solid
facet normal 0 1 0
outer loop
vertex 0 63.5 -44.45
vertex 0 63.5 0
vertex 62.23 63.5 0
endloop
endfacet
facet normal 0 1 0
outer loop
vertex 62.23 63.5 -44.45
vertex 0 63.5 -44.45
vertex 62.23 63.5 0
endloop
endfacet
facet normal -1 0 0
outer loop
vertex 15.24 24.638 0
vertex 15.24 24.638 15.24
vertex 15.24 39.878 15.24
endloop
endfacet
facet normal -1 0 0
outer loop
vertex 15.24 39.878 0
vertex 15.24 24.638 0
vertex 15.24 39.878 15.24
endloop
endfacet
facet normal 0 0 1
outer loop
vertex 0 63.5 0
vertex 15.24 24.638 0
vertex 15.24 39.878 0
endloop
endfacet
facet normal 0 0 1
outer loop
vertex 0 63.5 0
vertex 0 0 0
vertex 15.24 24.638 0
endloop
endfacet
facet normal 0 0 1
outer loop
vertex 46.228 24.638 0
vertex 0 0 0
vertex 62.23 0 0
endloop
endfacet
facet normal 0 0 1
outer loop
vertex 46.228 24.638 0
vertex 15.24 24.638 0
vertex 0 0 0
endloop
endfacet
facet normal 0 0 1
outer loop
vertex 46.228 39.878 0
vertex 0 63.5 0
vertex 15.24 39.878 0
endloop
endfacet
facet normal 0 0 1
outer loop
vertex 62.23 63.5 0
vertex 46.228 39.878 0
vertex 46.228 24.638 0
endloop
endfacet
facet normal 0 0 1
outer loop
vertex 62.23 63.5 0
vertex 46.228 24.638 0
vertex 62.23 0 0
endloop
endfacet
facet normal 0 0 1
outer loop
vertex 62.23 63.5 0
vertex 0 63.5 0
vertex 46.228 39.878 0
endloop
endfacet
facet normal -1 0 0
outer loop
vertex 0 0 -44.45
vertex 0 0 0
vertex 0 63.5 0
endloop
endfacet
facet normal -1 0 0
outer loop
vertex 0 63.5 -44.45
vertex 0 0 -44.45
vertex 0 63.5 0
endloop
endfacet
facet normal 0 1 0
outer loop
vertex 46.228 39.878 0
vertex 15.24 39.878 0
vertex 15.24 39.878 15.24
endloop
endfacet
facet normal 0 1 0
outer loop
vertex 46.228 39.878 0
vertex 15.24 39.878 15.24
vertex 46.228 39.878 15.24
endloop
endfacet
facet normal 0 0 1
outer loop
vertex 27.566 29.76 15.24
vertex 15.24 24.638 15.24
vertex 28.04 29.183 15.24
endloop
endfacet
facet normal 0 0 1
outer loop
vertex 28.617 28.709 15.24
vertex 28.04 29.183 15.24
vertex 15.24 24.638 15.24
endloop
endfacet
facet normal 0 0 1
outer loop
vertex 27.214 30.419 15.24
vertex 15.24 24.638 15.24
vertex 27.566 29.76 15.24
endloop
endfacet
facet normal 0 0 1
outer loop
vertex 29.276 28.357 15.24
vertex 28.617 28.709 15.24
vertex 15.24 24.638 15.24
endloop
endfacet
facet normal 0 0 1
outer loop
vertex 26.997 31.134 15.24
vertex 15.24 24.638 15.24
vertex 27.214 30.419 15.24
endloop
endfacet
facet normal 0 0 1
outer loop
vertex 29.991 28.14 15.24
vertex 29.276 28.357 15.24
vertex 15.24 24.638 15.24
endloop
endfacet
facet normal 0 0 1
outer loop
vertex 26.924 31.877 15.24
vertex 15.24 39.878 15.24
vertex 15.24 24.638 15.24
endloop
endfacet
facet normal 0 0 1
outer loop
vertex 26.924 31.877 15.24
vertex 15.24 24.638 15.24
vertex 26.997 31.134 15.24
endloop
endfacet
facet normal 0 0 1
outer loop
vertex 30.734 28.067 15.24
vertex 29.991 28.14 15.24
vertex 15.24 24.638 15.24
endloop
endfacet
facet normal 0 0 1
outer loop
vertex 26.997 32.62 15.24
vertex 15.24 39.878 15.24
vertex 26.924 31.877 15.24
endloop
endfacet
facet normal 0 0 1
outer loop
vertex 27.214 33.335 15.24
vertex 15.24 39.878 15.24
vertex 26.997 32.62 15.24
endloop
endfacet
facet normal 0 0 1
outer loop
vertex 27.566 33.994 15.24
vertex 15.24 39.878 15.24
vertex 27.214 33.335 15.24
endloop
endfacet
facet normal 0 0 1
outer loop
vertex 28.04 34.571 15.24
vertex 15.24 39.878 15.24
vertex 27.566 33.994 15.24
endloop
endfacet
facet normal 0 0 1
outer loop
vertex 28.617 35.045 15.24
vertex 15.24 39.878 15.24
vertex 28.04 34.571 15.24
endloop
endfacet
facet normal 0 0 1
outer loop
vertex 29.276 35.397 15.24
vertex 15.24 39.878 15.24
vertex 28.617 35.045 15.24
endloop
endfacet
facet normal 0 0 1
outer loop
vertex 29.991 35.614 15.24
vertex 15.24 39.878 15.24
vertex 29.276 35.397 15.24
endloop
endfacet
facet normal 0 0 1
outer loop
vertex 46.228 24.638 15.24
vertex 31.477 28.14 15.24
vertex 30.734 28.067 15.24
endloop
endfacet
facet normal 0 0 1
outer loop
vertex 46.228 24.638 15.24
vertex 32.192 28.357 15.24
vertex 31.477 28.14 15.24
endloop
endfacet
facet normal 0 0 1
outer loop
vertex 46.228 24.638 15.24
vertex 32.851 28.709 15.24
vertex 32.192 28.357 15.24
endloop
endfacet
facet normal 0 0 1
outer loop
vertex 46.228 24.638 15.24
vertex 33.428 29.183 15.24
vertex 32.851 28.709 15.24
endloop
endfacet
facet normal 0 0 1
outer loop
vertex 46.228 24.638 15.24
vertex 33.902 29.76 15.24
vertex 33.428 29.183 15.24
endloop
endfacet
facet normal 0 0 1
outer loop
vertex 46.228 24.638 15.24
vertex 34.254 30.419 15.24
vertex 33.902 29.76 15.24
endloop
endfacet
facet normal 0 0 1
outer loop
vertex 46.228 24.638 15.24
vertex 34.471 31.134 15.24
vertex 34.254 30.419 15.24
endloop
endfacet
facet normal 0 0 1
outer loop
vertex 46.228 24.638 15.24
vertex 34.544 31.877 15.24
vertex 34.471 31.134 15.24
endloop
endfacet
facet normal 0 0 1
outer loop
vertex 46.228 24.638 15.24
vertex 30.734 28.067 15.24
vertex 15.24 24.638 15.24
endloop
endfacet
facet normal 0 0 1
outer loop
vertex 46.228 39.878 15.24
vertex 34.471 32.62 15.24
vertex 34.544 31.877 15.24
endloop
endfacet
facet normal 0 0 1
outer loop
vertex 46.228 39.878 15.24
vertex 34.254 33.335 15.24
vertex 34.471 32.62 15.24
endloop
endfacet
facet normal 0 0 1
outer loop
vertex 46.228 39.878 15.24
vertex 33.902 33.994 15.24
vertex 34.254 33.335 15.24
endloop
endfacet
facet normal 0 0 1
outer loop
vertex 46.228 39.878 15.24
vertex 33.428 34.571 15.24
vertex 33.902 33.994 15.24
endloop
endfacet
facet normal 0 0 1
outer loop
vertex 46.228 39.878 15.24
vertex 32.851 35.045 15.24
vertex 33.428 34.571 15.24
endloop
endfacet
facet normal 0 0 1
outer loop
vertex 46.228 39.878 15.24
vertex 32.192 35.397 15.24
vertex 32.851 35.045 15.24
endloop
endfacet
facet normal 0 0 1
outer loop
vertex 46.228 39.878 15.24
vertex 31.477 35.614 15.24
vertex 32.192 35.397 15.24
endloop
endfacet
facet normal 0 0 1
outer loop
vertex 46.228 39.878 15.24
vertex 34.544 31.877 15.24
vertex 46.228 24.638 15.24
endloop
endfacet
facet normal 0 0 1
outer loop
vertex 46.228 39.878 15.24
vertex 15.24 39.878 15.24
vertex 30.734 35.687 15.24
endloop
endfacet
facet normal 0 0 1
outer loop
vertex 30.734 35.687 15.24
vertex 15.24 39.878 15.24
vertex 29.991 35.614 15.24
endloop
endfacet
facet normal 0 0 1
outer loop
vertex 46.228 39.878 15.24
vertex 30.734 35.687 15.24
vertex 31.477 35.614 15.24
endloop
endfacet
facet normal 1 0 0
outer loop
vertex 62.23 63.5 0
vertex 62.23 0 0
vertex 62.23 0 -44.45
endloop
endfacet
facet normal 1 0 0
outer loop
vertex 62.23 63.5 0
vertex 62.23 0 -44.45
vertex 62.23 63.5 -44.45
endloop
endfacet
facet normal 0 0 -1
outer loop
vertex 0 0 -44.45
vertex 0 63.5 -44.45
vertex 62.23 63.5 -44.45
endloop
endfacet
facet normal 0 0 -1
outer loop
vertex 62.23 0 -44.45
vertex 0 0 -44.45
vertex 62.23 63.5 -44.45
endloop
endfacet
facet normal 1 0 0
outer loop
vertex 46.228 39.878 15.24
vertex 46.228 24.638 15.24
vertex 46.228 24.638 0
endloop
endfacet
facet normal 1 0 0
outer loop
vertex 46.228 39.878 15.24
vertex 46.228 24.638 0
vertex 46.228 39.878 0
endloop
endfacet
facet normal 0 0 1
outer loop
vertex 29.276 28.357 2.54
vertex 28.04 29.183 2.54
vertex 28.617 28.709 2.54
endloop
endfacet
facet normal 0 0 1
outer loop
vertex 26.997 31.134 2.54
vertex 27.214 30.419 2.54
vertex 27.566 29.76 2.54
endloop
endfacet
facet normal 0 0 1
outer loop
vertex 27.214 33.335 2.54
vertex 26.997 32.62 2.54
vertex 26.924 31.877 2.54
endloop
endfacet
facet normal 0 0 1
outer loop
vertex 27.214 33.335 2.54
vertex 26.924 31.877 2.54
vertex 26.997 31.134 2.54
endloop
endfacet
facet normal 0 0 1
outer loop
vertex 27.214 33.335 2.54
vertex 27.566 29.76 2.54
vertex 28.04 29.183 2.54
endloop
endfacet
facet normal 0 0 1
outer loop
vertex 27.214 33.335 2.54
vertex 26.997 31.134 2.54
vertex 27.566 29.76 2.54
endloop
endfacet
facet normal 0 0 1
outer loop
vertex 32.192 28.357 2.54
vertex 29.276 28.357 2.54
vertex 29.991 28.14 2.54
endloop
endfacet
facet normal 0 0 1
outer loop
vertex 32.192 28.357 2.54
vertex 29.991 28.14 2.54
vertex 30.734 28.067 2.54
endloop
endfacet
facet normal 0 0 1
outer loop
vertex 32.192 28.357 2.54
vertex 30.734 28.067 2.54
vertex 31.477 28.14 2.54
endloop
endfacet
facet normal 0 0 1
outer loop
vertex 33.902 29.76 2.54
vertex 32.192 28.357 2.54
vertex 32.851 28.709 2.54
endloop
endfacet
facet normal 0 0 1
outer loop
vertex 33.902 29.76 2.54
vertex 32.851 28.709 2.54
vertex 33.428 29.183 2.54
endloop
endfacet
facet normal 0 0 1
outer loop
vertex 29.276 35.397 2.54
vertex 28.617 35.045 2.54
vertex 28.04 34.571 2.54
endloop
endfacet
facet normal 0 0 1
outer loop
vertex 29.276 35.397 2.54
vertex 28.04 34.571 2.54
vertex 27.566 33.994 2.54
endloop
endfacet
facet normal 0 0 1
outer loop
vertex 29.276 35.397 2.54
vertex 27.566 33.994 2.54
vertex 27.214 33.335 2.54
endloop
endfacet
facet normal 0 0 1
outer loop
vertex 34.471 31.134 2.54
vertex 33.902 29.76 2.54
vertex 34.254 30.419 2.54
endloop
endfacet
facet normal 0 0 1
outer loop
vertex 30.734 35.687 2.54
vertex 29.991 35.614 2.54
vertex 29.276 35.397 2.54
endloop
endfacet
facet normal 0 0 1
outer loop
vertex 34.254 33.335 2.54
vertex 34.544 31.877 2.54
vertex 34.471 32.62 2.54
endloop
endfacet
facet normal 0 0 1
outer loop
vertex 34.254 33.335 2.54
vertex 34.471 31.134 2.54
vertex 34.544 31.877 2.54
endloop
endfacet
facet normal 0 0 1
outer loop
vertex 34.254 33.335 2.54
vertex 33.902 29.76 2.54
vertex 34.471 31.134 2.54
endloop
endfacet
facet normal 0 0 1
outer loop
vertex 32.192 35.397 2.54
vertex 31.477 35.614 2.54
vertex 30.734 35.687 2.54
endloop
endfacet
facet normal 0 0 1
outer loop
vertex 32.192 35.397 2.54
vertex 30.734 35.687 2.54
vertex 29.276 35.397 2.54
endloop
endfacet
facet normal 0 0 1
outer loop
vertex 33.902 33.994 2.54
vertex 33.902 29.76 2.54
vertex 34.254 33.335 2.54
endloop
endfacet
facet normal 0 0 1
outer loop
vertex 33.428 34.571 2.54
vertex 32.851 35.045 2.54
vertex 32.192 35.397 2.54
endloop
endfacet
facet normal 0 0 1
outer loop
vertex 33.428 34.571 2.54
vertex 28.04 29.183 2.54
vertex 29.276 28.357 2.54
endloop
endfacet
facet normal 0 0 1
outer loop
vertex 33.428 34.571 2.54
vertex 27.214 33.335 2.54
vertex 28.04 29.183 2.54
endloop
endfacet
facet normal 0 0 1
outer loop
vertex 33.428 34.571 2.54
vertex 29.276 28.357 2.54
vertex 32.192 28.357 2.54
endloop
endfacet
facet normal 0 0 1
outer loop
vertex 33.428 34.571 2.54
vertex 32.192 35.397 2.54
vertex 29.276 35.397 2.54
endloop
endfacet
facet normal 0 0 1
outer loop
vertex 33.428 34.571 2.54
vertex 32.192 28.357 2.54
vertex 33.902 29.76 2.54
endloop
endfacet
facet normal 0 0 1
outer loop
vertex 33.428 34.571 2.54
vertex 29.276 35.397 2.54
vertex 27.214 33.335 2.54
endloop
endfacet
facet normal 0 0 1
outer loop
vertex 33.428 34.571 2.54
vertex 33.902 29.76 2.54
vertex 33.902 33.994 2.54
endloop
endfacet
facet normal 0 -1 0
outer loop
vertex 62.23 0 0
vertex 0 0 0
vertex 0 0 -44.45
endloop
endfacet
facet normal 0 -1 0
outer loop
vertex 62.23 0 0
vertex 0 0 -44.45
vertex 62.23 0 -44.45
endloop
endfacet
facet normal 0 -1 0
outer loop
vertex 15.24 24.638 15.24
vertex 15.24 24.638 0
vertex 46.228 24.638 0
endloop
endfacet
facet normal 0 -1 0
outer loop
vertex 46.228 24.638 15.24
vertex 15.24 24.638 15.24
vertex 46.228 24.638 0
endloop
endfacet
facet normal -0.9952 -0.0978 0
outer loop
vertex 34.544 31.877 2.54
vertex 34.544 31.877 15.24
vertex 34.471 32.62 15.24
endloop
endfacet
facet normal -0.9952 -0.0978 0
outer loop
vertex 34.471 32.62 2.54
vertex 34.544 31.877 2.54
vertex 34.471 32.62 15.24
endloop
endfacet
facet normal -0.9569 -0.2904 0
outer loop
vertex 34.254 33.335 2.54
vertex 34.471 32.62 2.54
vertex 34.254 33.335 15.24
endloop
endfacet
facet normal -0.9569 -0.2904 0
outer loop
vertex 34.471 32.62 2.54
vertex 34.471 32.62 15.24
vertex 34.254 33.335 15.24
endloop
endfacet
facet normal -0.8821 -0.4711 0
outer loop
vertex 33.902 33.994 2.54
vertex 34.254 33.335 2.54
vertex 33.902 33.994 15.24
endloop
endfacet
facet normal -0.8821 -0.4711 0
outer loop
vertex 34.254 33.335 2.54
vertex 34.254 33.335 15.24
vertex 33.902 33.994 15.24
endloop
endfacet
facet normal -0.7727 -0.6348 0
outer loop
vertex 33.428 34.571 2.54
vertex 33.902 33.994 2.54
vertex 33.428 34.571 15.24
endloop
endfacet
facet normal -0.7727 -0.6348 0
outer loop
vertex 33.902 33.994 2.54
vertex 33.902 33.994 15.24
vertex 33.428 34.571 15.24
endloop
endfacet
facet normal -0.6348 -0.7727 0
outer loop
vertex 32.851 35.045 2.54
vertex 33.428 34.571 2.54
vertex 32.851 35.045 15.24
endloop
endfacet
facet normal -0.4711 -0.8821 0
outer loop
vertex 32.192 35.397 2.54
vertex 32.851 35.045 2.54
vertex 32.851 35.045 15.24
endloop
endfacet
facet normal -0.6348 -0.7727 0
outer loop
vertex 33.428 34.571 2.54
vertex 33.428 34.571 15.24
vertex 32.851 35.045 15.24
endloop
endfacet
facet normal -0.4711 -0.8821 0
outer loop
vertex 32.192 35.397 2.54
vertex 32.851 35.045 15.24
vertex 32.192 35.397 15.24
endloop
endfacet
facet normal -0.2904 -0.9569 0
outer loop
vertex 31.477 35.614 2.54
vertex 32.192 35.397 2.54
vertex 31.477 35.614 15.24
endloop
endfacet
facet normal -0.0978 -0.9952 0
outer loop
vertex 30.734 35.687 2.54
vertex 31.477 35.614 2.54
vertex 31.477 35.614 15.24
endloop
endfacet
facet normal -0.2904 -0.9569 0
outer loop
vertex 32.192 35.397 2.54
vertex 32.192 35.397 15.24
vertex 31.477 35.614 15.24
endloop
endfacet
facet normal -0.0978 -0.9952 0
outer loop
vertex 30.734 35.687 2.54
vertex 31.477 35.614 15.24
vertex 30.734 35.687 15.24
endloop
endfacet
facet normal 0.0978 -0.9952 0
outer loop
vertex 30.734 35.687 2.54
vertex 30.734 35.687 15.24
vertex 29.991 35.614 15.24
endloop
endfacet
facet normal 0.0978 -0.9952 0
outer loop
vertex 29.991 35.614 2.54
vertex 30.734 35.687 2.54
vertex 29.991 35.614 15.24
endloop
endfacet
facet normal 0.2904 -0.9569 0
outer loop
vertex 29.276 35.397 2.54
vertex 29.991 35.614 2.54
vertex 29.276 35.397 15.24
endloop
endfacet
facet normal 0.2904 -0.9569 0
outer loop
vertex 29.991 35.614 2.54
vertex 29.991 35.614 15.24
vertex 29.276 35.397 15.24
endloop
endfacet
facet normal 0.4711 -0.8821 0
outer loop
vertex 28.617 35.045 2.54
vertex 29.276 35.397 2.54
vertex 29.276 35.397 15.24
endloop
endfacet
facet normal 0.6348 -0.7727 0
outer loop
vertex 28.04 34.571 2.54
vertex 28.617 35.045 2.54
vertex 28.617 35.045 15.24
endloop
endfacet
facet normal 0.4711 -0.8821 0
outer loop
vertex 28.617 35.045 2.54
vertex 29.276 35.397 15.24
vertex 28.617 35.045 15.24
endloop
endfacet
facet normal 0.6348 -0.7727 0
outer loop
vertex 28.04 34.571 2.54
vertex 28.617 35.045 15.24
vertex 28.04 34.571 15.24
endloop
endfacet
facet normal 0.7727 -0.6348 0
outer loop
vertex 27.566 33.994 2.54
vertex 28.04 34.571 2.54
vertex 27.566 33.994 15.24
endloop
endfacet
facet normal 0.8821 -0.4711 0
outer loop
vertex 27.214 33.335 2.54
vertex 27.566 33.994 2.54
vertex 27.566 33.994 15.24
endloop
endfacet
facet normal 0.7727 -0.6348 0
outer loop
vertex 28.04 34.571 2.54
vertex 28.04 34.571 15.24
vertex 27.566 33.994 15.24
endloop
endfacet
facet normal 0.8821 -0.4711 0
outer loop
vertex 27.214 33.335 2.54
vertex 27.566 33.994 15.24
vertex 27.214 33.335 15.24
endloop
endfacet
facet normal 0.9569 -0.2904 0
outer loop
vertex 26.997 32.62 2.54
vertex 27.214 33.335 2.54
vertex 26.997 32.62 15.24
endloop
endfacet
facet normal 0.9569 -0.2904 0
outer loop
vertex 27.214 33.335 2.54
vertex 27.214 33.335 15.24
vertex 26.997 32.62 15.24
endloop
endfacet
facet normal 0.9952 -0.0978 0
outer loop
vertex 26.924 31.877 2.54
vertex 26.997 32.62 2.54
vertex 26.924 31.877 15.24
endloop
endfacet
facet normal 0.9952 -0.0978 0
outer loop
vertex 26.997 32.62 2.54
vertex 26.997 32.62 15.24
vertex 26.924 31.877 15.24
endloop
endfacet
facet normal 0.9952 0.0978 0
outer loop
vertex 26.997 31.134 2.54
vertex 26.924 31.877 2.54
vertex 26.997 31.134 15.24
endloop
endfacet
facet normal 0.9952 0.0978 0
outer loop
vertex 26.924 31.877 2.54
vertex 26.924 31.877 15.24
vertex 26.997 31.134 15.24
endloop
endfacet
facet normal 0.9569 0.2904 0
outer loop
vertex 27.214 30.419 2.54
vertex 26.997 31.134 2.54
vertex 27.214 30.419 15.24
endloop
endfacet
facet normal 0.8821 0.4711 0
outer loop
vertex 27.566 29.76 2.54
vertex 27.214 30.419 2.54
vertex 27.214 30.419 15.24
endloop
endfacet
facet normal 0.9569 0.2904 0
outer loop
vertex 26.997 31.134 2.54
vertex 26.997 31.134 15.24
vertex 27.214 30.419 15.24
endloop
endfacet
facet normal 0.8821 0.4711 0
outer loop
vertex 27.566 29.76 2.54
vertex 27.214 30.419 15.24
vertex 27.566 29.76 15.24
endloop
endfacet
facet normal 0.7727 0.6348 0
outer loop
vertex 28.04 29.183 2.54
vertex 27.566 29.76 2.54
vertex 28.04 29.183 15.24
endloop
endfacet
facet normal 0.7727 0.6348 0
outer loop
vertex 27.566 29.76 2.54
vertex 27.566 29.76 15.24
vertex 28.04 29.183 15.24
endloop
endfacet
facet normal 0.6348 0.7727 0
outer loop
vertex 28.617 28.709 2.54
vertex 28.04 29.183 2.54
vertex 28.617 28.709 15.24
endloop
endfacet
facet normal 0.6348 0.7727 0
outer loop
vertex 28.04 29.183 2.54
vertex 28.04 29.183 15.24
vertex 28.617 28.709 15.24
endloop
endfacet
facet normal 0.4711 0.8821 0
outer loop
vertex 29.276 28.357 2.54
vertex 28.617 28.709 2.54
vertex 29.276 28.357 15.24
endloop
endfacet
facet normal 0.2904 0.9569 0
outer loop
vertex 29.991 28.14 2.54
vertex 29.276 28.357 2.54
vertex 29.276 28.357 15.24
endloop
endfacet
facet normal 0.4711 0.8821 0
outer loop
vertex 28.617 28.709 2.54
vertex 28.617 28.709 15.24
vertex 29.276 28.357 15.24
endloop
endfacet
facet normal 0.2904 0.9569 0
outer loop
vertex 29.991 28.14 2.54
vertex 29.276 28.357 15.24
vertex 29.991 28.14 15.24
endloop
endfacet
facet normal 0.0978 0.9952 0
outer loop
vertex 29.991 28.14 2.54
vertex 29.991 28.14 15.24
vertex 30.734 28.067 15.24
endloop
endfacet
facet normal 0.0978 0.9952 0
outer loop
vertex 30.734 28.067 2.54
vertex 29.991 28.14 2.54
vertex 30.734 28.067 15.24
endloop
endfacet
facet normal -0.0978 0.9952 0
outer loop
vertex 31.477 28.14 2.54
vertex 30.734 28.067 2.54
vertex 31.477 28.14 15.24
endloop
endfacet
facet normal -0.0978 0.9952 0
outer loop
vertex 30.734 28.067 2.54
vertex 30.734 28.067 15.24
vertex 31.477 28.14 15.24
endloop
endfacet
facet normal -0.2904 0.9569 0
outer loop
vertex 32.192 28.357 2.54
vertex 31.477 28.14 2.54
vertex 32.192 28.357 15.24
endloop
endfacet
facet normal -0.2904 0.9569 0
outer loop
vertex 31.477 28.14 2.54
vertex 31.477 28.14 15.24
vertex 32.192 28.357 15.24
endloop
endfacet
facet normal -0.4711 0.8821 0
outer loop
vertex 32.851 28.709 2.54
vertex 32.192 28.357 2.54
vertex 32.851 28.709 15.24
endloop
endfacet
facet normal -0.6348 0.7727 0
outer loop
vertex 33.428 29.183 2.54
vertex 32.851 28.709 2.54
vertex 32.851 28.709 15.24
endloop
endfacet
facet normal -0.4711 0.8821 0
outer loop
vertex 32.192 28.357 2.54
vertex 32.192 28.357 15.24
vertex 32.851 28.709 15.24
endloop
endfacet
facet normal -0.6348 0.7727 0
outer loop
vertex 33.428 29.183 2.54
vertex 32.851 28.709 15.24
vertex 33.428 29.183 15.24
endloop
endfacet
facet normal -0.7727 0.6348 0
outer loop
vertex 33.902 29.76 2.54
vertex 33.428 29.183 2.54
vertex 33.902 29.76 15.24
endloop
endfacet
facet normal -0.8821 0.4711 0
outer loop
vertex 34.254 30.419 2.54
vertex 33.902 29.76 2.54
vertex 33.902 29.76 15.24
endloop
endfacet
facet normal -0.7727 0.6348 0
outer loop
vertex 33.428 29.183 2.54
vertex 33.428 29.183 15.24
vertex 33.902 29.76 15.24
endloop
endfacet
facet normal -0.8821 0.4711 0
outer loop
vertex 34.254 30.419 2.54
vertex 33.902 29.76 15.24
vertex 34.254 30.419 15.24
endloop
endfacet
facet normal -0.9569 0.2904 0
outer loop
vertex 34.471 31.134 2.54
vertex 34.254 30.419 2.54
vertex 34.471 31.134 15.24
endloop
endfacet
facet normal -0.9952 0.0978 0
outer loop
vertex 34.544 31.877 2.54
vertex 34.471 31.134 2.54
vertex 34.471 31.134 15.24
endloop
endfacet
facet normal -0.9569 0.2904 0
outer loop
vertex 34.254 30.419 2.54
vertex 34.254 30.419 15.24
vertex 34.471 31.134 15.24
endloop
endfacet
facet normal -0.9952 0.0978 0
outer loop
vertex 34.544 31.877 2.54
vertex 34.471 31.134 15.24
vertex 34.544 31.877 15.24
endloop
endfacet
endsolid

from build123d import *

# Parameters (mm, degrees)
F0_W     = 62.23
F0_H     = 63.5
F1_DEPTH = 44.45
F2_W     = 30.988
F2_H     = 15.24
F3_DEPTH = 15.24
F4_R     = 3.81
F5_DEPTH = 12.7


with BuildPart() as f1:
    # F0 (on Top) → F1 (new body)
    with BuildSketch(Plane.XY):
        with Locations((31.115, 31.75)):
            Rectangle(F0_W, F0_H)
    extrude(amount=-F1_DEPTH)

    # F2 (on face) → F3 (join)
    with BuildSketch(Plane.XY):
        with Locations((30.734, 32.258)):
            Rectangle(F2_W, F2_H)
    extrude(amount=F3_DEPTH)

    # F4 (on face) → F5 (cut)
    with BuildSketch(Plane.XY.offset(15.24)):
        with Locations((30.734, 31.877)):
            Circle(F4_R)
    extrude(amount=-F5_DEPTH, mode=Mode.SUBTRACT)


solid = f1.part
